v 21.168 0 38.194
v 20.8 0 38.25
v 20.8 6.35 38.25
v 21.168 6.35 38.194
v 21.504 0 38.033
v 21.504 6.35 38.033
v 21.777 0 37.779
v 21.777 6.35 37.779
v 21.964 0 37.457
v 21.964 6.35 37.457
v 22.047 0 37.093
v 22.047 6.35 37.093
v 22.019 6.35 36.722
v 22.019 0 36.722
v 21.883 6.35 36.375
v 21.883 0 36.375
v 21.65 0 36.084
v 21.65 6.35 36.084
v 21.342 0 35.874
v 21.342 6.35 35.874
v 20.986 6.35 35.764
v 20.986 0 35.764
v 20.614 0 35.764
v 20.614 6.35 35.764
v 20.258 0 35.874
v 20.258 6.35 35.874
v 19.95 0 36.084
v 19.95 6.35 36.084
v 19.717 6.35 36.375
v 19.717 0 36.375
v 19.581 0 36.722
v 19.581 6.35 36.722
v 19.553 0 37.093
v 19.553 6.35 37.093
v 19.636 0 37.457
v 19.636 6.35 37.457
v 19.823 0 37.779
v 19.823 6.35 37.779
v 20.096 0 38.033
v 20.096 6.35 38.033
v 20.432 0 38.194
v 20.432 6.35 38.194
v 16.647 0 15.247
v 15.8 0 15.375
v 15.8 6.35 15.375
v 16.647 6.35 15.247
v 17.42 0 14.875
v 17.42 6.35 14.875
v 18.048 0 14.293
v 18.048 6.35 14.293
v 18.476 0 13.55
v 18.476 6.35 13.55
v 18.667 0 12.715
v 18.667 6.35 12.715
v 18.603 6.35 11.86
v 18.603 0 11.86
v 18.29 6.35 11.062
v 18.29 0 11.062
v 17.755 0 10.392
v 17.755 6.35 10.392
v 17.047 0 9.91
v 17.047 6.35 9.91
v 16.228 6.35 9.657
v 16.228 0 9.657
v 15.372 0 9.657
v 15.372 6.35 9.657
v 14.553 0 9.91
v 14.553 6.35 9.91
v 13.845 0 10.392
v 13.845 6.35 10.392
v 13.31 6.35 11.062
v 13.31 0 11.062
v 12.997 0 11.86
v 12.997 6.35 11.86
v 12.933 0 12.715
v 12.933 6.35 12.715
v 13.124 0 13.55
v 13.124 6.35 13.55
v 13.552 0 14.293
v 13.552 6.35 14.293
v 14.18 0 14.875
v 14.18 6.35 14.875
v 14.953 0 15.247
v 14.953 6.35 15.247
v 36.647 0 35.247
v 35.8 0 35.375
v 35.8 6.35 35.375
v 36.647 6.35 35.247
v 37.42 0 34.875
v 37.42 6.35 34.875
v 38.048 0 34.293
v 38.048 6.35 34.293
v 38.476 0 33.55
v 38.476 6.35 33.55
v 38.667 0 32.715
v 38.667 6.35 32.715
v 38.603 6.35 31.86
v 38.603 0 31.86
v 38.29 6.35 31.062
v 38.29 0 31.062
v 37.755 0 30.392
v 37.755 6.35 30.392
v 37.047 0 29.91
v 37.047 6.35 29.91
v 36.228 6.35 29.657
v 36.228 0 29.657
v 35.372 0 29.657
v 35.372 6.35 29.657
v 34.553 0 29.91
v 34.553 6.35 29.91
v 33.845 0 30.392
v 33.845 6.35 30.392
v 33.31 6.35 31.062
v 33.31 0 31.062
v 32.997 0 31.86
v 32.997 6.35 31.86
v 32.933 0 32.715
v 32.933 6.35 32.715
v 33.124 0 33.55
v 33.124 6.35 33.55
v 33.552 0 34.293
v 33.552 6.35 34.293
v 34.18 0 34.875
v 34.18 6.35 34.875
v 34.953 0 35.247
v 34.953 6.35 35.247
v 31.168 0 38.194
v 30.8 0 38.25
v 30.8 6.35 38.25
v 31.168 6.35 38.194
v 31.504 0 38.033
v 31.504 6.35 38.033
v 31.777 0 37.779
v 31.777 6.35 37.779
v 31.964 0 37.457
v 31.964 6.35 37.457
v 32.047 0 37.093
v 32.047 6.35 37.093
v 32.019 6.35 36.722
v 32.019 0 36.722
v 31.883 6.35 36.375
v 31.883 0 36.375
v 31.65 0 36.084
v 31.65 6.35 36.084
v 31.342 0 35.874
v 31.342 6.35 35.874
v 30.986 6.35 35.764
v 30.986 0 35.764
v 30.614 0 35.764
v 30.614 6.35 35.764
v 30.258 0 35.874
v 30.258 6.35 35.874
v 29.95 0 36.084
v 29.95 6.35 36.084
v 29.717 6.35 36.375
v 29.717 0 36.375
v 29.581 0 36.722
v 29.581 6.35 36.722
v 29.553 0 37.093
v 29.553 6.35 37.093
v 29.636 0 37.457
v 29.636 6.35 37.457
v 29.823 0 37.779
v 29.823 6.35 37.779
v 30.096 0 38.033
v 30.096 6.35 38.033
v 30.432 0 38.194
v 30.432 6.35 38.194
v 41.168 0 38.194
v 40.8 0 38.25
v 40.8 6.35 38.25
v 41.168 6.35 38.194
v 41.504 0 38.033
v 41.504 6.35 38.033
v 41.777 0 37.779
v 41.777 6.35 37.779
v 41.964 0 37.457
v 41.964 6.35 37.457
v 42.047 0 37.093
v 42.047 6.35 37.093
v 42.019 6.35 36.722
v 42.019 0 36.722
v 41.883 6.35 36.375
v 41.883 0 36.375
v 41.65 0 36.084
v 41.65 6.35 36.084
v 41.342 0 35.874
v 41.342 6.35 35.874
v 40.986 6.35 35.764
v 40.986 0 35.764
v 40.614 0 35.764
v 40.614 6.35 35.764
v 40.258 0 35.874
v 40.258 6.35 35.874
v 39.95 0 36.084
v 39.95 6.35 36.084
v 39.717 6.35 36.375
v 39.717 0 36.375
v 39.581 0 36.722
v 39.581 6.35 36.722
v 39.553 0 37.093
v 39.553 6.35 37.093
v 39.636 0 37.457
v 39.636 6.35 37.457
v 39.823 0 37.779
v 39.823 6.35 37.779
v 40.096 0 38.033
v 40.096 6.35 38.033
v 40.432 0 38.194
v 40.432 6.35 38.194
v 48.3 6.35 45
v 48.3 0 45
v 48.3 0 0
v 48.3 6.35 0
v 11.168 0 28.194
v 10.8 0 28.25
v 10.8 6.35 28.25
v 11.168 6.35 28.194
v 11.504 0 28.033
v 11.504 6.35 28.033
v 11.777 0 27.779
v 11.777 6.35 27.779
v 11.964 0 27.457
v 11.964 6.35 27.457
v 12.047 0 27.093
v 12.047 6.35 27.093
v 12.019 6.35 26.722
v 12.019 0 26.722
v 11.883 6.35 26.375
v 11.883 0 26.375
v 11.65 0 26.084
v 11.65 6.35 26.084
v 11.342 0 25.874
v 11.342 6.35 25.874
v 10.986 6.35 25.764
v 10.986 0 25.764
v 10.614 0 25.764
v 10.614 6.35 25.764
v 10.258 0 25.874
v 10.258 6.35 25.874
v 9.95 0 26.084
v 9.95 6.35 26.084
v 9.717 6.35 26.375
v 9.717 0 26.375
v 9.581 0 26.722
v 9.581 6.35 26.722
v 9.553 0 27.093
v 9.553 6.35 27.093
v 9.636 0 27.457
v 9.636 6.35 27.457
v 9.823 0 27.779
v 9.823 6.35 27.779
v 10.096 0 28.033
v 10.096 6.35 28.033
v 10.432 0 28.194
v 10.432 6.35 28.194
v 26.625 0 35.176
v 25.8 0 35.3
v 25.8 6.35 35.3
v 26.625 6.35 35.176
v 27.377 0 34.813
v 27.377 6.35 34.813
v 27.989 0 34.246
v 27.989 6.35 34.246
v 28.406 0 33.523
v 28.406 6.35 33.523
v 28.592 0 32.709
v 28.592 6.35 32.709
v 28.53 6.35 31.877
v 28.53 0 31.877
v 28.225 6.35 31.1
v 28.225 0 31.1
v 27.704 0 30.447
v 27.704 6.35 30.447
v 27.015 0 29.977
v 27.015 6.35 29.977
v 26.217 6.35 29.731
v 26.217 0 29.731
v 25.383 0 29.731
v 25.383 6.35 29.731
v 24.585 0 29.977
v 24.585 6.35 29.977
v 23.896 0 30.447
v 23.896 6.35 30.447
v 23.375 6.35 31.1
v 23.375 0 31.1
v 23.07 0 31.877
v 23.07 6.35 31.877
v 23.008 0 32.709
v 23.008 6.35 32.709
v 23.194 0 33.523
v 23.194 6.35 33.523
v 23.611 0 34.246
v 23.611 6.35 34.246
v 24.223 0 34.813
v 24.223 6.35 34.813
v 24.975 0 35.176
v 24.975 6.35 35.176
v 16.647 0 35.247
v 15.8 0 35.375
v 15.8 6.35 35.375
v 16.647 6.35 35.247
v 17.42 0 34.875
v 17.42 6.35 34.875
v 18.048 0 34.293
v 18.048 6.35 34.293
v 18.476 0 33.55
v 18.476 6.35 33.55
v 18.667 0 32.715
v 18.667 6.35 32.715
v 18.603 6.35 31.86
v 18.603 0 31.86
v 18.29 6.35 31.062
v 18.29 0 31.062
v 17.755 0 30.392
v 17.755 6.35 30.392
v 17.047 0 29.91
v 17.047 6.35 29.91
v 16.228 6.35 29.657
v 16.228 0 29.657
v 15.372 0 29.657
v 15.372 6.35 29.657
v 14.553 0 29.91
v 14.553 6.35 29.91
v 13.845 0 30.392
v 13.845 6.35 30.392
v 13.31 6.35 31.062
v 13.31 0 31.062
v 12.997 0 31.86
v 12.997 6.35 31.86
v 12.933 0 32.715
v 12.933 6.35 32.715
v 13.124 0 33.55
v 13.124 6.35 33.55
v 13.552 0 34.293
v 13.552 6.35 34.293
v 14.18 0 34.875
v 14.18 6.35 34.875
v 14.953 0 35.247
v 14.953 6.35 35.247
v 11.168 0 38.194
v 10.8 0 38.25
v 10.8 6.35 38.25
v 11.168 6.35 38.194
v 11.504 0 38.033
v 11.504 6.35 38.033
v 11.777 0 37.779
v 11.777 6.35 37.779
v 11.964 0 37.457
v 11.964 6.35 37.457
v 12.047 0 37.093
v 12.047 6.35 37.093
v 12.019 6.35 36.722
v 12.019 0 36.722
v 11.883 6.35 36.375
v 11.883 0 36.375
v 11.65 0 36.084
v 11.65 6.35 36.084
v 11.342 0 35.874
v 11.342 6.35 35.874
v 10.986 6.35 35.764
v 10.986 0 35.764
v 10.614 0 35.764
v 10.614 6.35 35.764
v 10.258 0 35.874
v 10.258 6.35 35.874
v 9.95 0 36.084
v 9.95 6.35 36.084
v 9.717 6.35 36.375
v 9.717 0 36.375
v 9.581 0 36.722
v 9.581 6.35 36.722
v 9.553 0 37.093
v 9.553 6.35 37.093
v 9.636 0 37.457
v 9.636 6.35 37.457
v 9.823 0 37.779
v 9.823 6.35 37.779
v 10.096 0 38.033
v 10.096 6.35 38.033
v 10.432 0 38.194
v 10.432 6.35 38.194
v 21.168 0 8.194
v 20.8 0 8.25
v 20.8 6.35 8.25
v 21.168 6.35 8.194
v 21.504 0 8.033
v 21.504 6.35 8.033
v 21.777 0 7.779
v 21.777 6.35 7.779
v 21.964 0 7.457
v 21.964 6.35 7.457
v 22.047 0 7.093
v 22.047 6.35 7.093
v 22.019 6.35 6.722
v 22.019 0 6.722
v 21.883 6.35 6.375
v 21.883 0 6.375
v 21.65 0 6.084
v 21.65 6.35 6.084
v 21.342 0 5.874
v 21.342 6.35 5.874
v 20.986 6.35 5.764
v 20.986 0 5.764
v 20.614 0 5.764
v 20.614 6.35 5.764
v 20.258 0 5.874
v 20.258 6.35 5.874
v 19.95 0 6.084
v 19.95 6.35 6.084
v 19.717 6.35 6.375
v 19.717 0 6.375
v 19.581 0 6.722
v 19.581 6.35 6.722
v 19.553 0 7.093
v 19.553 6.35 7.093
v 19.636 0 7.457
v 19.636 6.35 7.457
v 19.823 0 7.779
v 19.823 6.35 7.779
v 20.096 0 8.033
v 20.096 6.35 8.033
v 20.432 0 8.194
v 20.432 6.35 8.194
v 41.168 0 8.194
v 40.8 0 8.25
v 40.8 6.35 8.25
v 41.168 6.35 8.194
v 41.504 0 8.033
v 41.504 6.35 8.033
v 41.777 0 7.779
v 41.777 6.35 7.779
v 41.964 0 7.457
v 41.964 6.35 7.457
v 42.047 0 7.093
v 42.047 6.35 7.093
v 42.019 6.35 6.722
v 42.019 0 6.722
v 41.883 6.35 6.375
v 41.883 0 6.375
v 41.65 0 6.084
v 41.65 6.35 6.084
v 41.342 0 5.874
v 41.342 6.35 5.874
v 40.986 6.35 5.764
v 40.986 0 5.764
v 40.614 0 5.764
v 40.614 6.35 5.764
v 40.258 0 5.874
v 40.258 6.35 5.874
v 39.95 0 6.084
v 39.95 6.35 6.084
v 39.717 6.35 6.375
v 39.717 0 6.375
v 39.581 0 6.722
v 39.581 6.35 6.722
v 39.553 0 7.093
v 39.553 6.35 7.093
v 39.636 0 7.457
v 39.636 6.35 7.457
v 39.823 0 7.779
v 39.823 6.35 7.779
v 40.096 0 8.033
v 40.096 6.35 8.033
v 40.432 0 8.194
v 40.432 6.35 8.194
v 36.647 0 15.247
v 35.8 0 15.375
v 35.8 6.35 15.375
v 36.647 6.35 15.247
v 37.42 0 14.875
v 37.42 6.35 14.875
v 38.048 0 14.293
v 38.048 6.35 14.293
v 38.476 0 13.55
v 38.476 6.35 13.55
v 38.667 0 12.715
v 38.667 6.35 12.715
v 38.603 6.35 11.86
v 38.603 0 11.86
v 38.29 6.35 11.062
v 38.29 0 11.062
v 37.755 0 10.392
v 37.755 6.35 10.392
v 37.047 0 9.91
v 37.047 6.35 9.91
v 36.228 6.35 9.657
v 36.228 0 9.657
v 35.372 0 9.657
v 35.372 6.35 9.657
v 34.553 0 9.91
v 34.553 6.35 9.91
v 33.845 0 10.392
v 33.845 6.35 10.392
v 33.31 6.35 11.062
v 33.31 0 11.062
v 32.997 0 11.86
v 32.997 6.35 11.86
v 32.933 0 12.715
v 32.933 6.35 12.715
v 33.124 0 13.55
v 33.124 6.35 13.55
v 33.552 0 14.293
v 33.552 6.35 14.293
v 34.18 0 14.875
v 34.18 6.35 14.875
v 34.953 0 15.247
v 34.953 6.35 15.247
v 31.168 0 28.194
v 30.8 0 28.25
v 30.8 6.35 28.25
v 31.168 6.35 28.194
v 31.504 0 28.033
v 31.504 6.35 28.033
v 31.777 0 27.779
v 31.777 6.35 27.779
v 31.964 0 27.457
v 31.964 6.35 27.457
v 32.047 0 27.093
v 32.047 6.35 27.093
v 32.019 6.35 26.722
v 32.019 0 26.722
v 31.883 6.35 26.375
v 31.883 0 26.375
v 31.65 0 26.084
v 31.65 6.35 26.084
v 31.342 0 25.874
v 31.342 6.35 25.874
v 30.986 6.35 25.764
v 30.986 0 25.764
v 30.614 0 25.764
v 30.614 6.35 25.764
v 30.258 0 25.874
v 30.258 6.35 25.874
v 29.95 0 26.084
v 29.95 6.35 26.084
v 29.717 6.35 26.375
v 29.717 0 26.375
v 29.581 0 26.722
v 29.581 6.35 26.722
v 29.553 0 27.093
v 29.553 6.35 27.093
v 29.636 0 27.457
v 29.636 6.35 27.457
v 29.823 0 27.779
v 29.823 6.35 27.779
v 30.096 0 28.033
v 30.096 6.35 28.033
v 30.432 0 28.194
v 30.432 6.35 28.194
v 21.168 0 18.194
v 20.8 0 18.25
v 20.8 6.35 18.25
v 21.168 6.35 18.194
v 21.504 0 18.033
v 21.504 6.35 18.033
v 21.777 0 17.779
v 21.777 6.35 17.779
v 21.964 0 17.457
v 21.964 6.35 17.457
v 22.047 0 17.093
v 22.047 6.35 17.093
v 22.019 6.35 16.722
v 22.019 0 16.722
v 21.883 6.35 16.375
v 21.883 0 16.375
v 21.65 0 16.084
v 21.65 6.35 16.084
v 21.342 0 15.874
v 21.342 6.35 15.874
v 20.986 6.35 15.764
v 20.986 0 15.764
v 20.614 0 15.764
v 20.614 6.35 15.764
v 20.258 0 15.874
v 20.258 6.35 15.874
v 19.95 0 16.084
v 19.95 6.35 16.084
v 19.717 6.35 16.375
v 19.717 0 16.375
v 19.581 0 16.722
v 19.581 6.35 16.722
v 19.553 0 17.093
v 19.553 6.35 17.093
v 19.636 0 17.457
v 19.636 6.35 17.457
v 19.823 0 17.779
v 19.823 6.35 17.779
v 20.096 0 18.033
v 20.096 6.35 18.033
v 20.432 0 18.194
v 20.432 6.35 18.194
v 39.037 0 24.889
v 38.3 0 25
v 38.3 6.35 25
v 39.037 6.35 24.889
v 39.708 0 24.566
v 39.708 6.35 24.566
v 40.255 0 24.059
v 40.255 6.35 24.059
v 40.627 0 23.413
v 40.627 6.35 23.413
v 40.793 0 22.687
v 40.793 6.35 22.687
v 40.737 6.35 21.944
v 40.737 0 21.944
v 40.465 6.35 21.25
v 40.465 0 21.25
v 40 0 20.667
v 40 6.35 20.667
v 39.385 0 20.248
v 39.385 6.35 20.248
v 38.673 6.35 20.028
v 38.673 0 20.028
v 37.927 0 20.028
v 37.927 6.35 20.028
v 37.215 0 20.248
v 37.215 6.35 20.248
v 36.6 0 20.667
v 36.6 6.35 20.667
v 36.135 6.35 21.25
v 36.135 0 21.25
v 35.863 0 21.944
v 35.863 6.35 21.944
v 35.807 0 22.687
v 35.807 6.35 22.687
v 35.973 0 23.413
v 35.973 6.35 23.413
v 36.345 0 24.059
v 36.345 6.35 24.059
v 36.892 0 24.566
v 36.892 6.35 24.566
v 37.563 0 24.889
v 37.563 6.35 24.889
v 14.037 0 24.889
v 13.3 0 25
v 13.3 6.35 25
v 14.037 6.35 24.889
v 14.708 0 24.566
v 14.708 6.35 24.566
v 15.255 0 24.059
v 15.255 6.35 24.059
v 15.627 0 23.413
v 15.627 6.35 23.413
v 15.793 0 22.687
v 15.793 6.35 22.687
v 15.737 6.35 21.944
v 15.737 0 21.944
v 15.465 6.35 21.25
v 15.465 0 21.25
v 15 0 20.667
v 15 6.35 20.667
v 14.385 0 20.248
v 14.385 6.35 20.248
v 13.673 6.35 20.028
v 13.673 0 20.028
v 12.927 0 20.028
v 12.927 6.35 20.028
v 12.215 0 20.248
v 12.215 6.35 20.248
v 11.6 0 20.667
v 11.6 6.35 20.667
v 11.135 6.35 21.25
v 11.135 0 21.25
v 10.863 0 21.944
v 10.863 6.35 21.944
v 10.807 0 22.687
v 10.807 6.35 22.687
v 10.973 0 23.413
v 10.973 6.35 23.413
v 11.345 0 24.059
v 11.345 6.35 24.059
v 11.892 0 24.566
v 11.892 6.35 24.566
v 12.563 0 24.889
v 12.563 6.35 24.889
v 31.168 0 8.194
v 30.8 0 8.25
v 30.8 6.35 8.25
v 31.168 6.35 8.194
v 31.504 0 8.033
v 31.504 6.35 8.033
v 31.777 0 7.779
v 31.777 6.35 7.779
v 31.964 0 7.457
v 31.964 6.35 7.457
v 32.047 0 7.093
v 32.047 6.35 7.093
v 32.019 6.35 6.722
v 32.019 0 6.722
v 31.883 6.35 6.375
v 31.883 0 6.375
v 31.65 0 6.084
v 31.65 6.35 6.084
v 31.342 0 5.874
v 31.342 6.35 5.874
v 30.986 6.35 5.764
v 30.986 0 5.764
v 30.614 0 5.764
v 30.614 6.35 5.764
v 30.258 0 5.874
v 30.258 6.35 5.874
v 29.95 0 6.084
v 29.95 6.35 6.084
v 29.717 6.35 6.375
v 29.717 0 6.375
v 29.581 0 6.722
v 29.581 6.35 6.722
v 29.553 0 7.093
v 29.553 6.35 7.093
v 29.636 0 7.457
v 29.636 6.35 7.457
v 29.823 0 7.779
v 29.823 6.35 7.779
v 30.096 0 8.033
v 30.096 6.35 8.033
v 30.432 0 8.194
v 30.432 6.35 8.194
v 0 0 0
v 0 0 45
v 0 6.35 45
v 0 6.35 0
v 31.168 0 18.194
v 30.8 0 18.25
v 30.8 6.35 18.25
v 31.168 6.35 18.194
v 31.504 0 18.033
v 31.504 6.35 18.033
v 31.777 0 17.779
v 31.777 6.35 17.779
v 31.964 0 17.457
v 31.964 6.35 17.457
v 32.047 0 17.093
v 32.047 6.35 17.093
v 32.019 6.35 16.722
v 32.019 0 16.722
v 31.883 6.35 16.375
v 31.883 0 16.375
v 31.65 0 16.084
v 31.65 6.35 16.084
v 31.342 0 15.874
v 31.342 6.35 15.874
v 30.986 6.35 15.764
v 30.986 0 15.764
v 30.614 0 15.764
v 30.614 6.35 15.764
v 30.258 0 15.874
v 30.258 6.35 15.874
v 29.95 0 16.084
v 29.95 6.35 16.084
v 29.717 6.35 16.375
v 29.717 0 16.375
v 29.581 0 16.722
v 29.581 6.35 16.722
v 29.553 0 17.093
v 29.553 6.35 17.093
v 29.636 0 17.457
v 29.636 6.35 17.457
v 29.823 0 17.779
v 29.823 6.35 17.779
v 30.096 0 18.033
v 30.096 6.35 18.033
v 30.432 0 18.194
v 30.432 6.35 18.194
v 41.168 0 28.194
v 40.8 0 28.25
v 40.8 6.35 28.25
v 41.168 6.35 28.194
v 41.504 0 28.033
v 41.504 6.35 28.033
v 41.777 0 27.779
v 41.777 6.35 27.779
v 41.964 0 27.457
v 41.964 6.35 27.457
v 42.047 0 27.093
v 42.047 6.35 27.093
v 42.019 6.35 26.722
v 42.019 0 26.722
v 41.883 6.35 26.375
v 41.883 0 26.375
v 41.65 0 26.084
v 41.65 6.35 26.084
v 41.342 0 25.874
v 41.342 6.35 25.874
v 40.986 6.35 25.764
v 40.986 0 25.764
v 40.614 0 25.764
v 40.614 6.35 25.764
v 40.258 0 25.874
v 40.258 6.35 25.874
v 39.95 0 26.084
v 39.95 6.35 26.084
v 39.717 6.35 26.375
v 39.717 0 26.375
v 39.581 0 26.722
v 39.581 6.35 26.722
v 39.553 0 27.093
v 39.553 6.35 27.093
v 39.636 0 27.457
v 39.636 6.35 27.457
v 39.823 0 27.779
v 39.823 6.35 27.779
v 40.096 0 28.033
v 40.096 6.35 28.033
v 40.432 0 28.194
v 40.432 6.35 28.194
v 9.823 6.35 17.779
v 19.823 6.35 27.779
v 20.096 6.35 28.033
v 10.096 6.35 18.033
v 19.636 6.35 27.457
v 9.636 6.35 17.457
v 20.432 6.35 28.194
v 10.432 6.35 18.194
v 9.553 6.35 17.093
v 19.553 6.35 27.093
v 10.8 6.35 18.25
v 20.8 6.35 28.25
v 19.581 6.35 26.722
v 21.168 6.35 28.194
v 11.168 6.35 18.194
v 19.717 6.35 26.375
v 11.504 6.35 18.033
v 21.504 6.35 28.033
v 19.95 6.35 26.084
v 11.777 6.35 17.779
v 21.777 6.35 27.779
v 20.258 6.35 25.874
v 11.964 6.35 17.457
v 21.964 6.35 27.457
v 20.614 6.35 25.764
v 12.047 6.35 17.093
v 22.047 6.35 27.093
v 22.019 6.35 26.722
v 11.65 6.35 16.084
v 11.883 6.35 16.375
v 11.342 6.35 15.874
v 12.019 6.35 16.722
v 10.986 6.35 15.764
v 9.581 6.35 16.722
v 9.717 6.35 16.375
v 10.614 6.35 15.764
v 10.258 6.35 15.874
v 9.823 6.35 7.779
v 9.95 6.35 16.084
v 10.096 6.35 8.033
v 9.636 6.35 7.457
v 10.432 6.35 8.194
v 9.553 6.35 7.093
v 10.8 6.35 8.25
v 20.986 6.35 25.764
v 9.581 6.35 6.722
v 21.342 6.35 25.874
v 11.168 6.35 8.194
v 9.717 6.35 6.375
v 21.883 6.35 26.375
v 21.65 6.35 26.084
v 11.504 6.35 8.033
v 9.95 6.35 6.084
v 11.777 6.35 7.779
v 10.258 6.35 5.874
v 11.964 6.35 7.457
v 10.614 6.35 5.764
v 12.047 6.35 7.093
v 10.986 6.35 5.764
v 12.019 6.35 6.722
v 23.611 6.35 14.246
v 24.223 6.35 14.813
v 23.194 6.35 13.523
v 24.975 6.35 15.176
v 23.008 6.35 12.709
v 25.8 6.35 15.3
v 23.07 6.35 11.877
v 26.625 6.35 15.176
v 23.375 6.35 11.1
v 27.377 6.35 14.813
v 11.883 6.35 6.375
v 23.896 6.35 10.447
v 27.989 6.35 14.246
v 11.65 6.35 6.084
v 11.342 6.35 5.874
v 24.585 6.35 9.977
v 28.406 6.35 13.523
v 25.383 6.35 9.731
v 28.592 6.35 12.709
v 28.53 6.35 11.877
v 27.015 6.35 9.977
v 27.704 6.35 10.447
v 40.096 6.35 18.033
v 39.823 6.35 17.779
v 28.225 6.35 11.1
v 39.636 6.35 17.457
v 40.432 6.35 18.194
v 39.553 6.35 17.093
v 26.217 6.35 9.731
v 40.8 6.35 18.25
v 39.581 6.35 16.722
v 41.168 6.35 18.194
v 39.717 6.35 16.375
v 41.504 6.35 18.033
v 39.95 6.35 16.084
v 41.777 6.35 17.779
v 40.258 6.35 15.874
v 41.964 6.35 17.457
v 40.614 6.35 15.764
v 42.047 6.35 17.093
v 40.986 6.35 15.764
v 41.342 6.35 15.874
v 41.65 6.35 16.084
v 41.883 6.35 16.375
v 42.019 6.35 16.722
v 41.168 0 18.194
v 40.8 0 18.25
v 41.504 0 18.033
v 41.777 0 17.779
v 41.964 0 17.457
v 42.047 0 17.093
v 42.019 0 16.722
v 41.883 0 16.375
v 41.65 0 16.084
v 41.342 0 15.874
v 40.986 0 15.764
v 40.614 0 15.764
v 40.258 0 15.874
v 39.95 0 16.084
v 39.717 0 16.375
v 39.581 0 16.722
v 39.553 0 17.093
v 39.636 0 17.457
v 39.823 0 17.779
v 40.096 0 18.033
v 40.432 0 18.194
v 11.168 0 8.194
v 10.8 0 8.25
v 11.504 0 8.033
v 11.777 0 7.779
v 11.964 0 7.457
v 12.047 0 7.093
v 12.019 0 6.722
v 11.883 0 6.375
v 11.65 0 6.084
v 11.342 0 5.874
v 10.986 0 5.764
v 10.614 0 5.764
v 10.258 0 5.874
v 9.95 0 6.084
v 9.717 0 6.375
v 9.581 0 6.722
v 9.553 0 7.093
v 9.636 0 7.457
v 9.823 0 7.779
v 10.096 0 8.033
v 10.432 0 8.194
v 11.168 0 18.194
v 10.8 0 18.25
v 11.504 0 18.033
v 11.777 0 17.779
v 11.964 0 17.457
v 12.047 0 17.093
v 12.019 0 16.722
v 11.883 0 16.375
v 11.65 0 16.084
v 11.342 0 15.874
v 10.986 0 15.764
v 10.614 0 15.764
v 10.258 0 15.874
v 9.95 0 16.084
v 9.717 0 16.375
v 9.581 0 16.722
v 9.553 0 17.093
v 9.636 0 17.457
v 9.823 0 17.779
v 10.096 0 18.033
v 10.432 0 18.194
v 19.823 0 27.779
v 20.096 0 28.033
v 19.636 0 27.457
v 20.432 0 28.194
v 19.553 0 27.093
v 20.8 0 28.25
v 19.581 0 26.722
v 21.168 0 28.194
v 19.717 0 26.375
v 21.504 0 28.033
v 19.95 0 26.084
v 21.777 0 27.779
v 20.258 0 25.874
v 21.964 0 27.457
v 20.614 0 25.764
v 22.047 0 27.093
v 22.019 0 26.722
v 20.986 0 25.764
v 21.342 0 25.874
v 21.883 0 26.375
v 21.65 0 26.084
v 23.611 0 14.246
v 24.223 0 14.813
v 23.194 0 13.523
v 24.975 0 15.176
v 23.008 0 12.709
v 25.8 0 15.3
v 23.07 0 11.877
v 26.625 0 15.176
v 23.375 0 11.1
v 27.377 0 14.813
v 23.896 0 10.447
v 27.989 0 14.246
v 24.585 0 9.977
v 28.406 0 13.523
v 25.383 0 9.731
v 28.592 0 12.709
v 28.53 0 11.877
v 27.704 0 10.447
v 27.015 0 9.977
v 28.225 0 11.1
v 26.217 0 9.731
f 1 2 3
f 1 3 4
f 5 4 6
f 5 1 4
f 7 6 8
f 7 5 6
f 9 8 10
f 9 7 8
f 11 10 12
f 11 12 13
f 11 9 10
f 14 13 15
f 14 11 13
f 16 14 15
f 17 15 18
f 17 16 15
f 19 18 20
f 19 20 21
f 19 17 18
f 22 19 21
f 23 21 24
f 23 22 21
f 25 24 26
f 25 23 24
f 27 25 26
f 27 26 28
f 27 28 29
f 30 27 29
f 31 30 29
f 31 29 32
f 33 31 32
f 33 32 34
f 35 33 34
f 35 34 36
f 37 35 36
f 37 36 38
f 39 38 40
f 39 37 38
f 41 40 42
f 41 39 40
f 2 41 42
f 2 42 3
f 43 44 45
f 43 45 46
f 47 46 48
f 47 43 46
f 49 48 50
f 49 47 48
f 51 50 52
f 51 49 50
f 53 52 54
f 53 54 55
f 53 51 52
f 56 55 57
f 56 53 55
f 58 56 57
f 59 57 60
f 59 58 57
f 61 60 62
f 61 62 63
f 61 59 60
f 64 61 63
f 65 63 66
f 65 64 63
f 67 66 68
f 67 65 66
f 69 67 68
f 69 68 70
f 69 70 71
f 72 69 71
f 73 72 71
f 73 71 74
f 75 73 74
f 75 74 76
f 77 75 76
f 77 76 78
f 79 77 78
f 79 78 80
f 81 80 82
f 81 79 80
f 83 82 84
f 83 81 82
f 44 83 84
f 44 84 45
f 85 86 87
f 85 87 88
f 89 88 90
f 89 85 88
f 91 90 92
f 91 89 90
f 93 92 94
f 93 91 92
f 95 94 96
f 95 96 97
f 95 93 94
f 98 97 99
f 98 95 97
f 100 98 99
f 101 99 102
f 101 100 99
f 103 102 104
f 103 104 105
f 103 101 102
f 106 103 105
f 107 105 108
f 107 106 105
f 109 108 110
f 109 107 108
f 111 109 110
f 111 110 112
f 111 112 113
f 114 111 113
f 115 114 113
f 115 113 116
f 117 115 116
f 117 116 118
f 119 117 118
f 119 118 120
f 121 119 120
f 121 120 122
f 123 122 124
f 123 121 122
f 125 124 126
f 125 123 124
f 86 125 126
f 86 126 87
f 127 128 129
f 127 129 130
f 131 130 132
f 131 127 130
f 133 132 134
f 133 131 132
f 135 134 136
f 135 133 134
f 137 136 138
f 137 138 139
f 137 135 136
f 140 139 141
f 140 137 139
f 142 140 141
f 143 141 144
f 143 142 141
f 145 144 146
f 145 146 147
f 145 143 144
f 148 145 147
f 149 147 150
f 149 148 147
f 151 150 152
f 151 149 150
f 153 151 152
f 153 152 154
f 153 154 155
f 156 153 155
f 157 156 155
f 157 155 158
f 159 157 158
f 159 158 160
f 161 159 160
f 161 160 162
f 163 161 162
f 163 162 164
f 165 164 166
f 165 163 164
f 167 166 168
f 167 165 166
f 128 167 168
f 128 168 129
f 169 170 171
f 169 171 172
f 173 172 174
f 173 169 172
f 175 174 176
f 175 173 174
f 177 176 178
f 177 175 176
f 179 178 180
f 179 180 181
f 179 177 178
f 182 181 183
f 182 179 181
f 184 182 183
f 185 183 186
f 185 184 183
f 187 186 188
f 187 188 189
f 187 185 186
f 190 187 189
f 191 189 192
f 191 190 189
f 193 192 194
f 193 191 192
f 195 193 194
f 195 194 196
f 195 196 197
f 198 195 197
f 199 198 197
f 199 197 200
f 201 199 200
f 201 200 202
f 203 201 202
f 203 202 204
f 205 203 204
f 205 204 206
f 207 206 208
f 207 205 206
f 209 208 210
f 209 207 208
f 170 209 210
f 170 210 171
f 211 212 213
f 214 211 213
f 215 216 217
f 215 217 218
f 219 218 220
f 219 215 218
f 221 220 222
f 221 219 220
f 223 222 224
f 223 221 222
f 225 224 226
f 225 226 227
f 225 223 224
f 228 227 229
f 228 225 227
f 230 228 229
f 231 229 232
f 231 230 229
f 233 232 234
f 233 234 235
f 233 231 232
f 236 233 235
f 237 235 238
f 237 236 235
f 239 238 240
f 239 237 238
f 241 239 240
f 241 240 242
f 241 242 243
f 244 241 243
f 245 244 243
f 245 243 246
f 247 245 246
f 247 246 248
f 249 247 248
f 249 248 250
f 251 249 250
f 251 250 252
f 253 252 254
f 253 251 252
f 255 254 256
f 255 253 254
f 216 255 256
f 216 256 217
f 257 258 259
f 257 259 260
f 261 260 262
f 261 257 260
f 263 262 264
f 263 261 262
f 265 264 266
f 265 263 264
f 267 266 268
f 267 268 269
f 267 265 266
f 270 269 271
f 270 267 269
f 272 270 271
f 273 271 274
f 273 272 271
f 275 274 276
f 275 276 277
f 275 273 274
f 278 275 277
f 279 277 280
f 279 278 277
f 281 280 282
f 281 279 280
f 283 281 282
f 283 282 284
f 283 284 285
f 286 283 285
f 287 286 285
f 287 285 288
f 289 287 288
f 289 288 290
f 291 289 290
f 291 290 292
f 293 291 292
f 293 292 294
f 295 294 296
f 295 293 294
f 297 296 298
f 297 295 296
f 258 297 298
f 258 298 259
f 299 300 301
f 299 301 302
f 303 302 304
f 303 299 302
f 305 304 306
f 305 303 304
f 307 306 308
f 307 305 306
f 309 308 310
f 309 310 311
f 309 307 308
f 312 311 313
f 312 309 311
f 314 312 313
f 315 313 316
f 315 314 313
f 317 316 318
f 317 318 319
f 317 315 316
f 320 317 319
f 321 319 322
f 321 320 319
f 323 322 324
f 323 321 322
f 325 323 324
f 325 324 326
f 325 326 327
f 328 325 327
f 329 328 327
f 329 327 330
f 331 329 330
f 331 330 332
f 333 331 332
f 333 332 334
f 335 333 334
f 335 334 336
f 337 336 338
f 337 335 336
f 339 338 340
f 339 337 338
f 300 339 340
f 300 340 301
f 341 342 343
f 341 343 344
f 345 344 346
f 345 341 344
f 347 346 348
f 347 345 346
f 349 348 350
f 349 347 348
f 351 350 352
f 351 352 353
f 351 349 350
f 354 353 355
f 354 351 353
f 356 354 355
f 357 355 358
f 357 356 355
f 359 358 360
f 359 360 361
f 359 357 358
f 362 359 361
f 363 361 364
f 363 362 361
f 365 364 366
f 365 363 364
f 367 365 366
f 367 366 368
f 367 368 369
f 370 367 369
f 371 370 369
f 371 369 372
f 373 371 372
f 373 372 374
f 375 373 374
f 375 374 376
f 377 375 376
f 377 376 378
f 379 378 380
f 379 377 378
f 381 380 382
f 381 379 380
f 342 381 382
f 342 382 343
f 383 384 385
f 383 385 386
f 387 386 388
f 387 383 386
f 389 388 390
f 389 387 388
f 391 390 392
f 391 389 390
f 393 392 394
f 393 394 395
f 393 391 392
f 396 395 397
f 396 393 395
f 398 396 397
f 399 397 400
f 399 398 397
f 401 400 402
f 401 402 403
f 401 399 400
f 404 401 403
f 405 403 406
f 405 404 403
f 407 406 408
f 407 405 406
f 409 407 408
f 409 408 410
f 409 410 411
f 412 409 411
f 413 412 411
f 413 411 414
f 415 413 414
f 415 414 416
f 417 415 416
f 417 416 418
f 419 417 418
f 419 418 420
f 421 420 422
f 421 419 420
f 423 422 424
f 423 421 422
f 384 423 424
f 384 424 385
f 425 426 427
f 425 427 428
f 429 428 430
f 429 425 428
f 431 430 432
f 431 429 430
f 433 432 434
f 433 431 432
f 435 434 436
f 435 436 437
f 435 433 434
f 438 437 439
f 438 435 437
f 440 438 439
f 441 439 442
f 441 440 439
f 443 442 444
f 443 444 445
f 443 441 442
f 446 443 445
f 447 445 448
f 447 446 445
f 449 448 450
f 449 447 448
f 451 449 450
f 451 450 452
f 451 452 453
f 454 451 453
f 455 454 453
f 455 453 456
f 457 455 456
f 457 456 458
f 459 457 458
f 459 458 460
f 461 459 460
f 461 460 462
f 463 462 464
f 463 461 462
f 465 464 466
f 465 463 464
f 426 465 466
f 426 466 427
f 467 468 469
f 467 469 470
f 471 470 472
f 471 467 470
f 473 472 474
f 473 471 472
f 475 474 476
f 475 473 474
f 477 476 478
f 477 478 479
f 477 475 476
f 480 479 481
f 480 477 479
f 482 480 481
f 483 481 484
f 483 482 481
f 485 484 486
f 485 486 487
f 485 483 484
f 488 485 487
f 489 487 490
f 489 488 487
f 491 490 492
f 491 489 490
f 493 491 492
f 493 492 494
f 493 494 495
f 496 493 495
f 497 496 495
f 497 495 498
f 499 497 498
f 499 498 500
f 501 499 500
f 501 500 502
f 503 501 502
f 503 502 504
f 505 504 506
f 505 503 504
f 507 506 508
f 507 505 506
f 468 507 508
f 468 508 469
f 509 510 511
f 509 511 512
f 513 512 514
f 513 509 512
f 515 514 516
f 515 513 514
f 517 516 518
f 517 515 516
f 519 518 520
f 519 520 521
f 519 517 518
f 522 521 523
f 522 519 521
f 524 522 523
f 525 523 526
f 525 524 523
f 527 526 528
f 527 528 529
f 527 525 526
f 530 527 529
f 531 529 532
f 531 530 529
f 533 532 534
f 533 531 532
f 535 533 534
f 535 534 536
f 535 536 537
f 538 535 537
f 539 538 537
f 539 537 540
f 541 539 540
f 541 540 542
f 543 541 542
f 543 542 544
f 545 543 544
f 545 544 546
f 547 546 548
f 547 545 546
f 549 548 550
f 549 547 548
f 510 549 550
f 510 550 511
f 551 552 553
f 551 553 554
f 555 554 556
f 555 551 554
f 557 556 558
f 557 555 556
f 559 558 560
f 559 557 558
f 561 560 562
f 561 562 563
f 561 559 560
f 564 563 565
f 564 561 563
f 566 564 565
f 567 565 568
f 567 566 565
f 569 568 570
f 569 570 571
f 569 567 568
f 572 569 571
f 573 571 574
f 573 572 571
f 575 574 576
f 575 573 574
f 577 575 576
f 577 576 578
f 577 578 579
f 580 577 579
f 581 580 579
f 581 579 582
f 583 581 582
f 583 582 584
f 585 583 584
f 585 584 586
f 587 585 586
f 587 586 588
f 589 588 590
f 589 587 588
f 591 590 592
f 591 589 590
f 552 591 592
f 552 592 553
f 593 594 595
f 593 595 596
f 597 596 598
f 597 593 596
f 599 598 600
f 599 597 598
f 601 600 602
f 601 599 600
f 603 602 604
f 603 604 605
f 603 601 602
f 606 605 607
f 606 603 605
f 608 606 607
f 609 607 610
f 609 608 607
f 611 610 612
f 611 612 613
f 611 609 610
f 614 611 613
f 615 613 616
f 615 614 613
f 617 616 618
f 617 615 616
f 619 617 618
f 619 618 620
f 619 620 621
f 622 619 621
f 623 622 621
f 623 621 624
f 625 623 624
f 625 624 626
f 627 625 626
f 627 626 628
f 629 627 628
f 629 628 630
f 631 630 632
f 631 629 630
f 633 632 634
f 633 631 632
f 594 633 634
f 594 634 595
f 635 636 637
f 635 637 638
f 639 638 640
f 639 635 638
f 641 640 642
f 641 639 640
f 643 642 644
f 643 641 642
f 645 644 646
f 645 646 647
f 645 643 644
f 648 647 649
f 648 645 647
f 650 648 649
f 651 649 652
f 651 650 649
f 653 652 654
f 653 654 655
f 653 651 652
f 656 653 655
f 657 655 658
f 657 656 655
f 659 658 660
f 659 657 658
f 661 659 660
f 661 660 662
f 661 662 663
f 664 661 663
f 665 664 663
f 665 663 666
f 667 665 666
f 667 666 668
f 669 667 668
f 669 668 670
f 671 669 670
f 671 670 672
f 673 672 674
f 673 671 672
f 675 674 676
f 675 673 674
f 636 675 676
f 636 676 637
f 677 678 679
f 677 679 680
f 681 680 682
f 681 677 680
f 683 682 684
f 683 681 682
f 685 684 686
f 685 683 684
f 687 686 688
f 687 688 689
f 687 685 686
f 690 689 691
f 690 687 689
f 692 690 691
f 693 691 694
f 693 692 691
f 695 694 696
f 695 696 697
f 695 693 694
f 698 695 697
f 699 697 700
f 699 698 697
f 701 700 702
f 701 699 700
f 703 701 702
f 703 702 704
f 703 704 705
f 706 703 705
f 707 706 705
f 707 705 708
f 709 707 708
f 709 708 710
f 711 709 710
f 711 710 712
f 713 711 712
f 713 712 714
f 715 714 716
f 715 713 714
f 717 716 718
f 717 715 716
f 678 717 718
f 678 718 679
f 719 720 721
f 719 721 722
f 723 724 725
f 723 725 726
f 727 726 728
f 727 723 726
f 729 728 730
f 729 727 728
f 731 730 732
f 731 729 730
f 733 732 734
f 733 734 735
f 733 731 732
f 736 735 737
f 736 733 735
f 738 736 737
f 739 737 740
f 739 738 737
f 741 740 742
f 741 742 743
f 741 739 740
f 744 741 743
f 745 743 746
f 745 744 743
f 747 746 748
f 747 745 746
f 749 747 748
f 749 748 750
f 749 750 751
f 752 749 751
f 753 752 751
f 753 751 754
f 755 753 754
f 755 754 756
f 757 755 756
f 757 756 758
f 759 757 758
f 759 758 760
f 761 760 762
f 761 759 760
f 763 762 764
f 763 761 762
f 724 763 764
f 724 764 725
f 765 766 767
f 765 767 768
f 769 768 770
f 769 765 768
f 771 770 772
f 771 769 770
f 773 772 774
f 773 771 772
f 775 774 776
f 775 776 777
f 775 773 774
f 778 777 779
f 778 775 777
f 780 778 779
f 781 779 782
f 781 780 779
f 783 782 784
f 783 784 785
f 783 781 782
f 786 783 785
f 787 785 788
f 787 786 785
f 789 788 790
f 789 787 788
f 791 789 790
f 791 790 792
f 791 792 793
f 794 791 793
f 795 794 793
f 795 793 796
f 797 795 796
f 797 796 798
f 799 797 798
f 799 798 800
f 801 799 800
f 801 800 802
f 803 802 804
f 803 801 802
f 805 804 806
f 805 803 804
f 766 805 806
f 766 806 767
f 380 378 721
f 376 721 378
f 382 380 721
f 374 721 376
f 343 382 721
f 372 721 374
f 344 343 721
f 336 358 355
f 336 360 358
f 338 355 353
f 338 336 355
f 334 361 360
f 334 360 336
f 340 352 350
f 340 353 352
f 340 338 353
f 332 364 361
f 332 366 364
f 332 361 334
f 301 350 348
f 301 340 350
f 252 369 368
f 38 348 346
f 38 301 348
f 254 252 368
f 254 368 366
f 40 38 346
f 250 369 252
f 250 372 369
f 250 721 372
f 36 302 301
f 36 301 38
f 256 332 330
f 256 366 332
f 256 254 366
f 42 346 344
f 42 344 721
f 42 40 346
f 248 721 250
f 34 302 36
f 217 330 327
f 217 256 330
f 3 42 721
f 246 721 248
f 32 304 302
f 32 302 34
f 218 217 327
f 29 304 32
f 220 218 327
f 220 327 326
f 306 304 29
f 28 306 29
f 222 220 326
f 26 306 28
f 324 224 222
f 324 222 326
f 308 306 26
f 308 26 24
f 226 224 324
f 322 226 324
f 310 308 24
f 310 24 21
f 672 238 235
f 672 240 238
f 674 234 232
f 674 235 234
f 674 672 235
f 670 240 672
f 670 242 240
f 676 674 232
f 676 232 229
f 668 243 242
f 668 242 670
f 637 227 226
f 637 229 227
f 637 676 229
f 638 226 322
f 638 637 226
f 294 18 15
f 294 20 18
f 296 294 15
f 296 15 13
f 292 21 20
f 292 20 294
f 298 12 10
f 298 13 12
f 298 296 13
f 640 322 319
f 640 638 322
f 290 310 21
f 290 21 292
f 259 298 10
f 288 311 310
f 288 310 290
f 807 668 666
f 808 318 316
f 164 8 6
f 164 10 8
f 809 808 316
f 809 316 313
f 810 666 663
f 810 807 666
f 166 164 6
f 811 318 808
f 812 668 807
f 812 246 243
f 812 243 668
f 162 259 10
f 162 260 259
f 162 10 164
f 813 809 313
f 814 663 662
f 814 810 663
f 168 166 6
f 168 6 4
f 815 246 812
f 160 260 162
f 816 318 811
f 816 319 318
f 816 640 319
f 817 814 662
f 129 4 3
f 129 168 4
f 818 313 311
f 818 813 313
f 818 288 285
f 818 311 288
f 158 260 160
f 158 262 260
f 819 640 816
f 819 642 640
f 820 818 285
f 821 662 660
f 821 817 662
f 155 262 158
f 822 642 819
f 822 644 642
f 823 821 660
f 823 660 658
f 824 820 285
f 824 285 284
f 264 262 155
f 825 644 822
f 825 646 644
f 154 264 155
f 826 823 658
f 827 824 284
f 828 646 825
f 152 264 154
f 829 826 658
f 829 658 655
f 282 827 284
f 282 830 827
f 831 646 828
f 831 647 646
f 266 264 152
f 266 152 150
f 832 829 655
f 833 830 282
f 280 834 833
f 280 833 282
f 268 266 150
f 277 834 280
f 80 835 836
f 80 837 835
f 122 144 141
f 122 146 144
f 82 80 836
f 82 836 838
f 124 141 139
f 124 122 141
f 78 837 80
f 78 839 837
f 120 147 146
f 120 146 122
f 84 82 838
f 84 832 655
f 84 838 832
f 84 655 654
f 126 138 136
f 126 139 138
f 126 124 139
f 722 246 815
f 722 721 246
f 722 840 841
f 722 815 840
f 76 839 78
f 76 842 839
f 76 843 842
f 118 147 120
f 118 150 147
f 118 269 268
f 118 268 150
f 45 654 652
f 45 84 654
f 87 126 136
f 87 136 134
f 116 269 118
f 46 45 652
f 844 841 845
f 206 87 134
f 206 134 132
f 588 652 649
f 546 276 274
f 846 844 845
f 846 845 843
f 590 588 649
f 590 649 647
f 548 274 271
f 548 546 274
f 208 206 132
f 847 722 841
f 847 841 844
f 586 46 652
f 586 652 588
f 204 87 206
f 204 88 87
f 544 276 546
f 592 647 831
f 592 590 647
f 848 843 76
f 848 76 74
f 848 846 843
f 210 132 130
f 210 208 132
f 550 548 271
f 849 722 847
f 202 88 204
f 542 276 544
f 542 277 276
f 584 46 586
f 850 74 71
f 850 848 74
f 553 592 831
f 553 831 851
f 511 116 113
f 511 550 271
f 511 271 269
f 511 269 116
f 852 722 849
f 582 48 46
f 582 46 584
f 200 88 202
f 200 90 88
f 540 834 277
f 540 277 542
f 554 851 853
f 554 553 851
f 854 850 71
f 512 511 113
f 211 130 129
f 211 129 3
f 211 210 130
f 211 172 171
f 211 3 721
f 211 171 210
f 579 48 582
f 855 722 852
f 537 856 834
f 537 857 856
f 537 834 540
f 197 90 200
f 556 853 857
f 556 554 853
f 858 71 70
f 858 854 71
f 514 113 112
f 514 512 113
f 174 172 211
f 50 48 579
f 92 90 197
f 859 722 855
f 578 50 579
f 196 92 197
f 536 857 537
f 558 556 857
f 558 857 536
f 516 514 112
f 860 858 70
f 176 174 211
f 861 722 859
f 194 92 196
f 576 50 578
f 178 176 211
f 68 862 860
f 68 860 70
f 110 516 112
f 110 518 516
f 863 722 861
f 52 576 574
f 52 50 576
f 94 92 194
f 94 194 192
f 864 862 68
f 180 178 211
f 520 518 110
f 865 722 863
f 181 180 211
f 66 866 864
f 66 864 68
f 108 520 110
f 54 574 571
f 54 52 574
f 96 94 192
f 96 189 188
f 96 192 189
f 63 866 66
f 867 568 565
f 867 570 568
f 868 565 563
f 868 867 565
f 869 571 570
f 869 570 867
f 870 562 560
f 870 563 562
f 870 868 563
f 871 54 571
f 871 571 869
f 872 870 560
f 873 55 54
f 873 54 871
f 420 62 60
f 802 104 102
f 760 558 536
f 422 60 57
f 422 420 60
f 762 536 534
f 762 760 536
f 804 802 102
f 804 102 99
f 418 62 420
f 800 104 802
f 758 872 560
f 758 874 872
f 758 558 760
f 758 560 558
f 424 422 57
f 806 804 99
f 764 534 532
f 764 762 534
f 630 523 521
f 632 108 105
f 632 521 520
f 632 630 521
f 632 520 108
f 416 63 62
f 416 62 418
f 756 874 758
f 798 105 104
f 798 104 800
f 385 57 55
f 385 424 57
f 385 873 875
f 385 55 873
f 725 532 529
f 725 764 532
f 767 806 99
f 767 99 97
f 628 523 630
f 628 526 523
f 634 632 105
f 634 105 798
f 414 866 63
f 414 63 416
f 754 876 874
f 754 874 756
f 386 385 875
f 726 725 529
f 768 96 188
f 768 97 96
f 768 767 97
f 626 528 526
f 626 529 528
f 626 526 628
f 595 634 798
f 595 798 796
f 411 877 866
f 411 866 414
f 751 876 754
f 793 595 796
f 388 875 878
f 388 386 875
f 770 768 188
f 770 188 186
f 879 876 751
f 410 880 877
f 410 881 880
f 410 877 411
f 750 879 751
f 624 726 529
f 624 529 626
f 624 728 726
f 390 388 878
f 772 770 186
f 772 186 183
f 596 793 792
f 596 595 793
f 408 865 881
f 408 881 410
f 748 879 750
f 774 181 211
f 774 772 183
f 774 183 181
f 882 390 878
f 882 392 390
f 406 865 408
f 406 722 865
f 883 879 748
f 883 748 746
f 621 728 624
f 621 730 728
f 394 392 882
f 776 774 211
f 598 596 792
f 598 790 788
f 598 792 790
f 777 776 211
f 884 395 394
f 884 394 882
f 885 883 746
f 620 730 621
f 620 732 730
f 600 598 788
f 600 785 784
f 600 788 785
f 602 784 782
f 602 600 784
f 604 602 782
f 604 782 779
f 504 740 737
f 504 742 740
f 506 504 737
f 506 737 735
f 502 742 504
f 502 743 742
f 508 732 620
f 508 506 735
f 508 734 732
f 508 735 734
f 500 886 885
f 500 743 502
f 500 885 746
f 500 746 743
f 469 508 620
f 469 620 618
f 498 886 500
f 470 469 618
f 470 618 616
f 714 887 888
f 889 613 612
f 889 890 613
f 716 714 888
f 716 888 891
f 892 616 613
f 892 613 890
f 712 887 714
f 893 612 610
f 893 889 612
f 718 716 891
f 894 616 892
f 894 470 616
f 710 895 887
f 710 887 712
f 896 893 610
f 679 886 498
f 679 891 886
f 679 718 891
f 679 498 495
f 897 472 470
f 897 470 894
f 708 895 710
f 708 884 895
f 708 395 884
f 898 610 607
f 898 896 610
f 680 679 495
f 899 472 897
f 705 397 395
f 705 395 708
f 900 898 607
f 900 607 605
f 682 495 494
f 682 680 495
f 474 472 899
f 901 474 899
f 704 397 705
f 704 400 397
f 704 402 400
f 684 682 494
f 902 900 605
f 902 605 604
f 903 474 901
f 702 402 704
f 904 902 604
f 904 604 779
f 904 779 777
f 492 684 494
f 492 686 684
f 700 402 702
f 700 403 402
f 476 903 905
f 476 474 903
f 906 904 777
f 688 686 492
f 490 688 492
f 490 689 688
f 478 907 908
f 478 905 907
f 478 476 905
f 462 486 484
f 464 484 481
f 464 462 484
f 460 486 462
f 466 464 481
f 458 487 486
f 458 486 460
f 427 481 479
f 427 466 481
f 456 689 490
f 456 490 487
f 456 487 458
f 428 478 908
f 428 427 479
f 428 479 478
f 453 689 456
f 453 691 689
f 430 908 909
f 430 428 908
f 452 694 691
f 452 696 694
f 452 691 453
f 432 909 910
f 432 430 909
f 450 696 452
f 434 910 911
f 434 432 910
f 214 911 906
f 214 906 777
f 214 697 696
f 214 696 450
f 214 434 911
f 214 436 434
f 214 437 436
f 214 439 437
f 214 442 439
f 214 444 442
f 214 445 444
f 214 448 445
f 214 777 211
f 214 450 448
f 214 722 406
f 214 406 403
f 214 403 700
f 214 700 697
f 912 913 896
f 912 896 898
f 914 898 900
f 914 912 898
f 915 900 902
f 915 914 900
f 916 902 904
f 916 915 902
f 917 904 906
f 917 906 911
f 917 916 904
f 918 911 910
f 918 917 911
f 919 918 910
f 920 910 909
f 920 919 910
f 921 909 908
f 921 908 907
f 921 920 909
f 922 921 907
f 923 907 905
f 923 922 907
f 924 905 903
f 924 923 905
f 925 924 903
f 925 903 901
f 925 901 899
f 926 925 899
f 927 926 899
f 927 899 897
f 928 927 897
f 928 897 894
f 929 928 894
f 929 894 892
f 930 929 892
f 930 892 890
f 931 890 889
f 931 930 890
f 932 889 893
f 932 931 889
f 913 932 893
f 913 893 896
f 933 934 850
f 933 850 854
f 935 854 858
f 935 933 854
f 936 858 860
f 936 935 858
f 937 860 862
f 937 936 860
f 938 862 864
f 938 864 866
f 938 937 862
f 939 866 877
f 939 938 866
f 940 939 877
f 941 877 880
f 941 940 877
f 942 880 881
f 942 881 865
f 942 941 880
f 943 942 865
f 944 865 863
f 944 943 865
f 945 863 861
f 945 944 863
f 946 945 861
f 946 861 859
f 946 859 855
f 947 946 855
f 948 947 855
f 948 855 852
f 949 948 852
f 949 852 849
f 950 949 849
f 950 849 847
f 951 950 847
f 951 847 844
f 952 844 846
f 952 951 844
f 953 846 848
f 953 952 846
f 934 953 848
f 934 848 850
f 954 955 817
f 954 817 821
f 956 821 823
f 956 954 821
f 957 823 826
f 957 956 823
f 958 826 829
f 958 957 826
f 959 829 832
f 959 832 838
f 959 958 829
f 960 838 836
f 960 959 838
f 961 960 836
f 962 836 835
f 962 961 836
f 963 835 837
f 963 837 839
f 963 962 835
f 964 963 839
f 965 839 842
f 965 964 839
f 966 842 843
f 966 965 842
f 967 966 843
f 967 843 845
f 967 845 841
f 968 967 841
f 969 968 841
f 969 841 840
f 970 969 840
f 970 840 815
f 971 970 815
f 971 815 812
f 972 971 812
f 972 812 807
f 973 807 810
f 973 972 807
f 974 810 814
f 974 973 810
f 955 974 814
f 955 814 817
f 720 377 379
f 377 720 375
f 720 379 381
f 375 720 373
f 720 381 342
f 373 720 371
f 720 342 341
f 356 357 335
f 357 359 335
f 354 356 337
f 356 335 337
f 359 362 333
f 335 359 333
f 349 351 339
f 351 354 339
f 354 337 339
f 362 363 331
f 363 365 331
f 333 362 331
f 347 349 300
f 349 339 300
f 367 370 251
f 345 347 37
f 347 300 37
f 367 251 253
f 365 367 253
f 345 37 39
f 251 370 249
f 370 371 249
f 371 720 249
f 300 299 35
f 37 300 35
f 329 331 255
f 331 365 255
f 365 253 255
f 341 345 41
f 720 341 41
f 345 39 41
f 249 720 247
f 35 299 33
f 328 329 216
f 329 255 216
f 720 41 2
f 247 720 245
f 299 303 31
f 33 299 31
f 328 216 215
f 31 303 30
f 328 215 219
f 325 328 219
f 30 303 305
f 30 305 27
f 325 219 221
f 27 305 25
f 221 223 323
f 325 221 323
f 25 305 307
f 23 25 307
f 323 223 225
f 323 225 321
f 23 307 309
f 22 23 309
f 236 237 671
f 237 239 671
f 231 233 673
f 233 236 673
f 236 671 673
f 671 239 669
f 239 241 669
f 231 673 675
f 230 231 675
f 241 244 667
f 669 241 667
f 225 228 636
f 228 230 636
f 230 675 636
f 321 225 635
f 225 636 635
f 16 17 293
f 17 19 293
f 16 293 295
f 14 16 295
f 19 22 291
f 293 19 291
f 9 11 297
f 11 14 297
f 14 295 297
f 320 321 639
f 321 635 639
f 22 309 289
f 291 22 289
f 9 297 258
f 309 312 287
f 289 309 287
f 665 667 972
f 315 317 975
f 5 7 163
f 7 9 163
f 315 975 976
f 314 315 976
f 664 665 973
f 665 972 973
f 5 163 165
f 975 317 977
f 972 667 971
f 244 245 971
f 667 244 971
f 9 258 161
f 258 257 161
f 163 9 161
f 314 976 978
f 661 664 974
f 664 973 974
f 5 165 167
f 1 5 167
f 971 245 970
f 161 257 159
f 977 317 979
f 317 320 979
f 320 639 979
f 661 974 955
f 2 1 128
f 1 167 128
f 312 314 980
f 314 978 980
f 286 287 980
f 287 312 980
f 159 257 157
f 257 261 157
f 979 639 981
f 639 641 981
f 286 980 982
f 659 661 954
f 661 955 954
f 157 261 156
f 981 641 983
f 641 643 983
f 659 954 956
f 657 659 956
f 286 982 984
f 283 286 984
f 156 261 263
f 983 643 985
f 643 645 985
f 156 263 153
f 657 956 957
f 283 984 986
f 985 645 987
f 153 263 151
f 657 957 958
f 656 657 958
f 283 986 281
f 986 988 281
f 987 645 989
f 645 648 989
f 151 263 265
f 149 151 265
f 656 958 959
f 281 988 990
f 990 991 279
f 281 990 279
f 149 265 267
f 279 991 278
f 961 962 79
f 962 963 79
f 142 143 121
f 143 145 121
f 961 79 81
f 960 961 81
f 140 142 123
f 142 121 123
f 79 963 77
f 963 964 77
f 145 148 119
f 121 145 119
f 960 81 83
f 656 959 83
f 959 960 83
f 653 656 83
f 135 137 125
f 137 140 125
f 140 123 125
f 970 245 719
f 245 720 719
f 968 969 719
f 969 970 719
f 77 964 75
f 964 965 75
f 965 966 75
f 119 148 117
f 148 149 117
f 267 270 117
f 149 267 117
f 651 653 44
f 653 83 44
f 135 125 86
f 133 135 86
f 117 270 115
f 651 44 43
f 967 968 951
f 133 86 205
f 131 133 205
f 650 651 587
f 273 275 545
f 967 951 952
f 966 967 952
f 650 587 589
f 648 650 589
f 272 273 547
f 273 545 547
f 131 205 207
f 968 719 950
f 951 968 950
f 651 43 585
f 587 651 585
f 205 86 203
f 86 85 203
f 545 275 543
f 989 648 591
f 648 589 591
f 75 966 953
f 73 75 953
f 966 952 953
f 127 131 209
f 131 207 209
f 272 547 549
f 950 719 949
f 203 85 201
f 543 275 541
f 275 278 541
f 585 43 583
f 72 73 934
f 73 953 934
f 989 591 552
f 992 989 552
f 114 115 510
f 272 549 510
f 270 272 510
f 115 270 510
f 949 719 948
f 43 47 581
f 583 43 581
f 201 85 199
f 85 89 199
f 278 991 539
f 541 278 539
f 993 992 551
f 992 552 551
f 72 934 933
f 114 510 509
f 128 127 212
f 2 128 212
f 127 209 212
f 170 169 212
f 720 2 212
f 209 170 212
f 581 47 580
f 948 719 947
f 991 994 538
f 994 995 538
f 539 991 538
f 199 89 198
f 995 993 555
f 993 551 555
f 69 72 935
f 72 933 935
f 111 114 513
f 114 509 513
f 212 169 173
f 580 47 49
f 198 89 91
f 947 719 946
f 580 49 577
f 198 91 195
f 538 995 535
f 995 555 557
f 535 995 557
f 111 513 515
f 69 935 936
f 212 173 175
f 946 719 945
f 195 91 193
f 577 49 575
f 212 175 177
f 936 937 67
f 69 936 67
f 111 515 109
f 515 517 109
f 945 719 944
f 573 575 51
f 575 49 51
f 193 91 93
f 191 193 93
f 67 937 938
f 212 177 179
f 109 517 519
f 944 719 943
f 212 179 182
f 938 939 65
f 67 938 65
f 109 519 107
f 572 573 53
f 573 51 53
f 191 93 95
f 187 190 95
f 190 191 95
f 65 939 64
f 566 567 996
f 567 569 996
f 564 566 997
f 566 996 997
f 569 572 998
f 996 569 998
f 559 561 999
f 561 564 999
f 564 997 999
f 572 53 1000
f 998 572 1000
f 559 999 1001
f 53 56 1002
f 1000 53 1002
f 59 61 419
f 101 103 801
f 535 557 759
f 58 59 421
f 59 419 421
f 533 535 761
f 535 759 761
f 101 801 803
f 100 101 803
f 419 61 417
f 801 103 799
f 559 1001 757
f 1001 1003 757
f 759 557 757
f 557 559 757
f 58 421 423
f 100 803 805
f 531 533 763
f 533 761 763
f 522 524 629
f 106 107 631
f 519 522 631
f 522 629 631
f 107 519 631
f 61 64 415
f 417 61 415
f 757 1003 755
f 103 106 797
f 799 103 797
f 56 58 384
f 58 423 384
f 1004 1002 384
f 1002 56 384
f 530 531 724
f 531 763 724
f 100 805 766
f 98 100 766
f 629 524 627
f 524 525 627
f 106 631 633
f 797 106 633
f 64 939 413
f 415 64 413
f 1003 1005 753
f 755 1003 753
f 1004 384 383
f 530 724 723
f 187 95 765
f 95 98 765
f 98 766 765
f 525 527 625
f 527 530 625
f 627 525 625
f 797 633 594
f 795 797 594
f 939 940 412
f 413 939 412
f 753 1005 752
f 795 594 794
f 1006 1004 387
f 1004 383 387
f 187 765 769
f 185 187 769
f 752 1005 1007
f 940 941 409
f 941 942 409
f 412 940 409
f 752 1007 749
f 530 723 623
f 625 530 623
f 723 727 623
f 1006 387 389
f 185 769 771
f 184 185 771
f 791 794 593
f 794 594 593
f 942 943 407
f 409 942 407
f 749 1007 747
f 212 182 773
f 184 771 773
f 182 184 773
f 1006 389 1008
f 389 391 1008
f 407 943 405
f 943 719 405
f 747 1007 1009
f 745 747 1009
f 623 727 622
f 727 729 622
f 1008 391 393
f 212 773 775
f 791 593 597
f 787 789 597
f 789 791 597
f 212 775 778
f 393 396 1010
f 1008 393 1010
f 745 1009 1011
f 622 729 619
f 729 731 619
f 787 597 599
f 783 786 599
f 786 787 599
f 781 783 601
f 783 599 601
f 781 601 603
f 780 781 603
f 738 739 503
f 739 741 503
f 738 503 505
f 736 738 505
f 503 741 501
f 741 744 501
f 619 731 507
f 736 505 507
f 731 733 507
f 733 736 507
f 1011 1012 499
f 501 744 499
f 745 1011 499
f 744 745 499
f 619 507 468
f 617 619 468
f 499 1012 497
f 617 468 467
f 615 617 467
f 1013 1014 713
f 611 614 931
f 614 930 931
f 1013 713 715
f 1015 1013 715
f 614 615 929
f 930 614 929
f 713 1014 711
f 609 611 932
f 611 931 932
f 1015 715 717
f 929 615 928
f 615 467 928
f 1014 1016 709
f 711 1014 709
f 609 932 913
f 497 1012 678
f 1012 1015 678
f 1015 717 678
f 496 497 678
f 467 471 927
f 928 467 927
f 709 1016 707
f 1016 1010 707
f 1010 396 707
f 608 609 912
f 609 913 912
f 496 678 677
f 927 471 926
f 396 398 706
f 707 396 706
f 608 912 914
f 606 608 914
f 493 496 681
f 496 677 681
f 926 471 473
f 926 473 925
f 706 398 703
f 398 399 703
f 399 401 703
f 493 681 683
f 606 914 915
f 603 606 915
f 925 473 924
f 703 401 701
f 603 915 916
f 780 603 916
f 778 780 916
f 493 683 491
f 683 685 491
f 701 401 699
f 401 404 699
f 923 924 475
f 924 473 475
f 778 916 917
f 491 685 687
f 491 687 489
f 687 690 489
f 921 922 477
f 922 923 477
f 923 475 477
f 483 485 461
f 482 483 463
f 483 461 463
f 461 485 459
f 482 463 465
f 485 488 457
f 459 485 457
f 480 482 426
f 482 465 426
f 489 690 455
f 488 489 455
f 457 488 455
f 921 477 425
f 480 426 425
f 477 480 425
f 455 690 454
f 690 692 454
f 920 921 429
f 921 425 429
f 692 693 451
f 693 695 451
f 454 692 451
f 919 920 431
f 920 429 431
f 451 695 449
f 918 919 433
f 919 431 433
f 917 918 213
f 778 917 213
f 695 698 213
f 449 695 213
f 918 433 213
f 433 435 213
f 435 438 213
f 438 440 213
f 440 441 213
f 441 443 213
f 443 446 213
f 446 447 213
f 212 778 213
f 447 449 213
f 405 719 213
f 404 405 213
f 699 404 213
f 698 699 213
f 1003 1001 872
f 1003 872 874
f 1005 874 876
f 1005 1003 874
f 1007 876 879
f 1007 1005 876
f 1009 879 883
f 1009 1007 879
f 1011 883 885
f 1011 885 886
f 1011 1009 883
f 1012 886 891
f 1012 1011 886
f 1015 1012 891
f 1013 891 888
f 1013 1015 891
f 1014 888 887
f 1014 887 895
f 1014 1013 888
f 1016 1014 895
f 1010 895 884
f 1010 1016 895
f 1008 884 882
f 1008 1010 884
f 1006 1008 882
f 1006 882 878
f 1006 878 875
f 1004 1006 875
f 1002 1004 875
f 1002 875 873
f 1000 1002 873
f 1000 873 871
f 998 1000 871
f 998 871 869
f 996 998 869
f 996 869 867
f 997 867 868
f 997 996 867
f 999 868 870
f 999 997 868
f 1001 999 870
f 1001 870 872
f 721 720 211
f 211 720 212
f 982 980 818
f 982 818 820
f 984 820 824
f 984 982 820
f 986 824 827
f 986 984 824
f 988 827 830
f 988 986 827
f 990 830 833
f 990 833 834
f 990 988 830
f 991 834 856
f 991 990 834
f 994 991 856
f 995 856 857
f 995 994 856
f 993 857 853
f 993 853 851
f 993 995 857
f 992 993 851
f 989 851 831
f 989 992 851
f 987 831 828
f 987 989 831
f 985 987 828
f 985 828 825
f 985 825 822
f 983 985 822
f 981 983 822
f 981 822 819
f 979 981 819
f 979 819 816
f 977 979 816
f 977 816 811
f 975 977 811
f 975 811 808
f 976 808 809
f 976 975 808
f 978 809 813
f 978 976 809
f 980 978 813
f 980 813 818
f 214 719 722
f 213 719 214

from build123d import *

# Parameters (mm, degrees)
SKETCH1_W           = 48.3
SKETCH1_H           = 45
SKETCH1_R           = 2.875
SKETCH1_R_2         = 1.25
SKETCH1_R_3         = 2.8
SKETCH1_R_4         = 2.5
BOSS_EXTRUDE1_DEPTH = 6.35


with BuildPart() as part:
    # Sketch1 → Boss-Extrude1 (new body)
    with BuildSketch(Plane(origin=(0, 0, 0), x_dir=(1, 0, 0), z_dir=(0, 1, 0))):
        with Locations((24.15, -22.5)):
            Rectangle(SKETCH1_W, SKETCH1_H)
        with Locations(Location((15.8, -12.5, 0), (0, 0, 270))):
            Circle(SKETCH1_R, mode=Mode.SUBTRACT)
        with Locations(Location((35.8, -12.5, 0), (0, 0, 270))):
            Circle(SKETCH1_R, mode=Mode.SUBTRACT)
        with Locations(Location((15.8, -32.5, 0), (0, 0, 270))):
            Circle(SKETCH1_R, mode=Mode.SUBTRACT)
        with Locations(Location((35.8, -32.5, 0), (0, 0, 270))):
            Circle(SKETCH1_R, mode=Mode.SUBTRACT)
        with Locations(Location((10.8, -7, 0), (0, 0, 270))):
            Circle(SKETCH1_R_2, mode=Mode.SUBTRACT)
        with Locations(Location((20.8, -7, 0), (0, 0, 270))):
            Circle(SKETCH1_R_2, mode=Mode.SUBTRACT)
        with Locations(Location((30.8, -7, 0), (0, 0, 270))):
            Circle(SKETCH1_R_2, mode=Mode.SUBTRACT)
        with Locations(Location((40.8, -7, 0), (0, 0, 270))):
            Circle(SKETCH1_R_2, mode=Mode.SUBTRACT)
        with Locations(Location((20.8, -17, 0), (0, 0, 270))):
            Circle(SKETCH1_R_2, mode=Mode.SUBTRACT)
        with Locations(Location((30.8, -17, 0), (0, 0, 270))):
            Circle(SKETCH1_R_2, mode=Mode.SUBTRACT)
        with Locations(Location((40.8, -17, 0), (0, 0, 270))):
            Circle(SKETCH1_R_2, mode=Mode.SUBTRACT)
        with Locations(Location((20.8, -27, 0), (0, 0, 270))):
            Circle(SKETCH1_R_2, mode=Mode.SUBTRACT)
        with Locations(Location((30.8, -27, 0), (0, 0, 270))):
            Circle(SKETCH1_R_2, mode=Mode.SUBTRACT)
        with Locations(Location((40.8, -27, 0), (0, 0, 270))):
            Circle(SKETCH1_R_2, mode=Mode.SUBTRACT)
        with Locations(Location((20.8, -37, 0), (0, 0, 270))):
            Circle(SKETCH1_R_2, mode=Mode.SUBTRACT)
        with Locations(Location((30.8, -37, 0), (0, 0, 270))):
            Circle(SKETCH1_R_2, mode=Mode.SUBTRACT)
        with Locations(Location((40.8, -37, 0), (0, 0, 270))):
            Circle(SKETCH1_R_2, mode=Mode.SUBTRACT)
        with Locations(Location((10.8, -17, 0), (0, 0, 270))):
            Circle(SKETCH1_R_2, mode=Mode.SUBTRACT)
        with Locations(Location((10.8, -27, 0), (0, 0, 270))):
            Circle(SKETCH1_R_2, mode=Mode.SUBTRACT)
        with Locations(Location((10.8, -37, 0), (0, 0, 270))):
            Circle(SKETCH1_R_2, mode=Mode.SUBTRACT)
        with Locations(Location((25.8, -12.5, 0), (0, 0, 270))):
            Circle(SKETCH1_R_3, mode=Mode.SUBTRACT)
        with Locations(Location((25.8, -32.5, 0), (0, 0, 270))):
            Circle(SKETCH1_R_3, mode=Mode.SUBTRACT)
        with Locations(Location((13.3, -22.5, 0), (0, 0, 270))):
            Circle(SKETCH1_R_4, mode=Mode.SUBTRACT)
        with Locations(Location((38.3, -22.5, 0), (0, 0, 270))):
            Circle(SKETCH1_R_4, mode=Mode.SUBTRACT)
    extrude(amount=BOSS_EXTRUDE1_DEPTH)


solid = part.part
